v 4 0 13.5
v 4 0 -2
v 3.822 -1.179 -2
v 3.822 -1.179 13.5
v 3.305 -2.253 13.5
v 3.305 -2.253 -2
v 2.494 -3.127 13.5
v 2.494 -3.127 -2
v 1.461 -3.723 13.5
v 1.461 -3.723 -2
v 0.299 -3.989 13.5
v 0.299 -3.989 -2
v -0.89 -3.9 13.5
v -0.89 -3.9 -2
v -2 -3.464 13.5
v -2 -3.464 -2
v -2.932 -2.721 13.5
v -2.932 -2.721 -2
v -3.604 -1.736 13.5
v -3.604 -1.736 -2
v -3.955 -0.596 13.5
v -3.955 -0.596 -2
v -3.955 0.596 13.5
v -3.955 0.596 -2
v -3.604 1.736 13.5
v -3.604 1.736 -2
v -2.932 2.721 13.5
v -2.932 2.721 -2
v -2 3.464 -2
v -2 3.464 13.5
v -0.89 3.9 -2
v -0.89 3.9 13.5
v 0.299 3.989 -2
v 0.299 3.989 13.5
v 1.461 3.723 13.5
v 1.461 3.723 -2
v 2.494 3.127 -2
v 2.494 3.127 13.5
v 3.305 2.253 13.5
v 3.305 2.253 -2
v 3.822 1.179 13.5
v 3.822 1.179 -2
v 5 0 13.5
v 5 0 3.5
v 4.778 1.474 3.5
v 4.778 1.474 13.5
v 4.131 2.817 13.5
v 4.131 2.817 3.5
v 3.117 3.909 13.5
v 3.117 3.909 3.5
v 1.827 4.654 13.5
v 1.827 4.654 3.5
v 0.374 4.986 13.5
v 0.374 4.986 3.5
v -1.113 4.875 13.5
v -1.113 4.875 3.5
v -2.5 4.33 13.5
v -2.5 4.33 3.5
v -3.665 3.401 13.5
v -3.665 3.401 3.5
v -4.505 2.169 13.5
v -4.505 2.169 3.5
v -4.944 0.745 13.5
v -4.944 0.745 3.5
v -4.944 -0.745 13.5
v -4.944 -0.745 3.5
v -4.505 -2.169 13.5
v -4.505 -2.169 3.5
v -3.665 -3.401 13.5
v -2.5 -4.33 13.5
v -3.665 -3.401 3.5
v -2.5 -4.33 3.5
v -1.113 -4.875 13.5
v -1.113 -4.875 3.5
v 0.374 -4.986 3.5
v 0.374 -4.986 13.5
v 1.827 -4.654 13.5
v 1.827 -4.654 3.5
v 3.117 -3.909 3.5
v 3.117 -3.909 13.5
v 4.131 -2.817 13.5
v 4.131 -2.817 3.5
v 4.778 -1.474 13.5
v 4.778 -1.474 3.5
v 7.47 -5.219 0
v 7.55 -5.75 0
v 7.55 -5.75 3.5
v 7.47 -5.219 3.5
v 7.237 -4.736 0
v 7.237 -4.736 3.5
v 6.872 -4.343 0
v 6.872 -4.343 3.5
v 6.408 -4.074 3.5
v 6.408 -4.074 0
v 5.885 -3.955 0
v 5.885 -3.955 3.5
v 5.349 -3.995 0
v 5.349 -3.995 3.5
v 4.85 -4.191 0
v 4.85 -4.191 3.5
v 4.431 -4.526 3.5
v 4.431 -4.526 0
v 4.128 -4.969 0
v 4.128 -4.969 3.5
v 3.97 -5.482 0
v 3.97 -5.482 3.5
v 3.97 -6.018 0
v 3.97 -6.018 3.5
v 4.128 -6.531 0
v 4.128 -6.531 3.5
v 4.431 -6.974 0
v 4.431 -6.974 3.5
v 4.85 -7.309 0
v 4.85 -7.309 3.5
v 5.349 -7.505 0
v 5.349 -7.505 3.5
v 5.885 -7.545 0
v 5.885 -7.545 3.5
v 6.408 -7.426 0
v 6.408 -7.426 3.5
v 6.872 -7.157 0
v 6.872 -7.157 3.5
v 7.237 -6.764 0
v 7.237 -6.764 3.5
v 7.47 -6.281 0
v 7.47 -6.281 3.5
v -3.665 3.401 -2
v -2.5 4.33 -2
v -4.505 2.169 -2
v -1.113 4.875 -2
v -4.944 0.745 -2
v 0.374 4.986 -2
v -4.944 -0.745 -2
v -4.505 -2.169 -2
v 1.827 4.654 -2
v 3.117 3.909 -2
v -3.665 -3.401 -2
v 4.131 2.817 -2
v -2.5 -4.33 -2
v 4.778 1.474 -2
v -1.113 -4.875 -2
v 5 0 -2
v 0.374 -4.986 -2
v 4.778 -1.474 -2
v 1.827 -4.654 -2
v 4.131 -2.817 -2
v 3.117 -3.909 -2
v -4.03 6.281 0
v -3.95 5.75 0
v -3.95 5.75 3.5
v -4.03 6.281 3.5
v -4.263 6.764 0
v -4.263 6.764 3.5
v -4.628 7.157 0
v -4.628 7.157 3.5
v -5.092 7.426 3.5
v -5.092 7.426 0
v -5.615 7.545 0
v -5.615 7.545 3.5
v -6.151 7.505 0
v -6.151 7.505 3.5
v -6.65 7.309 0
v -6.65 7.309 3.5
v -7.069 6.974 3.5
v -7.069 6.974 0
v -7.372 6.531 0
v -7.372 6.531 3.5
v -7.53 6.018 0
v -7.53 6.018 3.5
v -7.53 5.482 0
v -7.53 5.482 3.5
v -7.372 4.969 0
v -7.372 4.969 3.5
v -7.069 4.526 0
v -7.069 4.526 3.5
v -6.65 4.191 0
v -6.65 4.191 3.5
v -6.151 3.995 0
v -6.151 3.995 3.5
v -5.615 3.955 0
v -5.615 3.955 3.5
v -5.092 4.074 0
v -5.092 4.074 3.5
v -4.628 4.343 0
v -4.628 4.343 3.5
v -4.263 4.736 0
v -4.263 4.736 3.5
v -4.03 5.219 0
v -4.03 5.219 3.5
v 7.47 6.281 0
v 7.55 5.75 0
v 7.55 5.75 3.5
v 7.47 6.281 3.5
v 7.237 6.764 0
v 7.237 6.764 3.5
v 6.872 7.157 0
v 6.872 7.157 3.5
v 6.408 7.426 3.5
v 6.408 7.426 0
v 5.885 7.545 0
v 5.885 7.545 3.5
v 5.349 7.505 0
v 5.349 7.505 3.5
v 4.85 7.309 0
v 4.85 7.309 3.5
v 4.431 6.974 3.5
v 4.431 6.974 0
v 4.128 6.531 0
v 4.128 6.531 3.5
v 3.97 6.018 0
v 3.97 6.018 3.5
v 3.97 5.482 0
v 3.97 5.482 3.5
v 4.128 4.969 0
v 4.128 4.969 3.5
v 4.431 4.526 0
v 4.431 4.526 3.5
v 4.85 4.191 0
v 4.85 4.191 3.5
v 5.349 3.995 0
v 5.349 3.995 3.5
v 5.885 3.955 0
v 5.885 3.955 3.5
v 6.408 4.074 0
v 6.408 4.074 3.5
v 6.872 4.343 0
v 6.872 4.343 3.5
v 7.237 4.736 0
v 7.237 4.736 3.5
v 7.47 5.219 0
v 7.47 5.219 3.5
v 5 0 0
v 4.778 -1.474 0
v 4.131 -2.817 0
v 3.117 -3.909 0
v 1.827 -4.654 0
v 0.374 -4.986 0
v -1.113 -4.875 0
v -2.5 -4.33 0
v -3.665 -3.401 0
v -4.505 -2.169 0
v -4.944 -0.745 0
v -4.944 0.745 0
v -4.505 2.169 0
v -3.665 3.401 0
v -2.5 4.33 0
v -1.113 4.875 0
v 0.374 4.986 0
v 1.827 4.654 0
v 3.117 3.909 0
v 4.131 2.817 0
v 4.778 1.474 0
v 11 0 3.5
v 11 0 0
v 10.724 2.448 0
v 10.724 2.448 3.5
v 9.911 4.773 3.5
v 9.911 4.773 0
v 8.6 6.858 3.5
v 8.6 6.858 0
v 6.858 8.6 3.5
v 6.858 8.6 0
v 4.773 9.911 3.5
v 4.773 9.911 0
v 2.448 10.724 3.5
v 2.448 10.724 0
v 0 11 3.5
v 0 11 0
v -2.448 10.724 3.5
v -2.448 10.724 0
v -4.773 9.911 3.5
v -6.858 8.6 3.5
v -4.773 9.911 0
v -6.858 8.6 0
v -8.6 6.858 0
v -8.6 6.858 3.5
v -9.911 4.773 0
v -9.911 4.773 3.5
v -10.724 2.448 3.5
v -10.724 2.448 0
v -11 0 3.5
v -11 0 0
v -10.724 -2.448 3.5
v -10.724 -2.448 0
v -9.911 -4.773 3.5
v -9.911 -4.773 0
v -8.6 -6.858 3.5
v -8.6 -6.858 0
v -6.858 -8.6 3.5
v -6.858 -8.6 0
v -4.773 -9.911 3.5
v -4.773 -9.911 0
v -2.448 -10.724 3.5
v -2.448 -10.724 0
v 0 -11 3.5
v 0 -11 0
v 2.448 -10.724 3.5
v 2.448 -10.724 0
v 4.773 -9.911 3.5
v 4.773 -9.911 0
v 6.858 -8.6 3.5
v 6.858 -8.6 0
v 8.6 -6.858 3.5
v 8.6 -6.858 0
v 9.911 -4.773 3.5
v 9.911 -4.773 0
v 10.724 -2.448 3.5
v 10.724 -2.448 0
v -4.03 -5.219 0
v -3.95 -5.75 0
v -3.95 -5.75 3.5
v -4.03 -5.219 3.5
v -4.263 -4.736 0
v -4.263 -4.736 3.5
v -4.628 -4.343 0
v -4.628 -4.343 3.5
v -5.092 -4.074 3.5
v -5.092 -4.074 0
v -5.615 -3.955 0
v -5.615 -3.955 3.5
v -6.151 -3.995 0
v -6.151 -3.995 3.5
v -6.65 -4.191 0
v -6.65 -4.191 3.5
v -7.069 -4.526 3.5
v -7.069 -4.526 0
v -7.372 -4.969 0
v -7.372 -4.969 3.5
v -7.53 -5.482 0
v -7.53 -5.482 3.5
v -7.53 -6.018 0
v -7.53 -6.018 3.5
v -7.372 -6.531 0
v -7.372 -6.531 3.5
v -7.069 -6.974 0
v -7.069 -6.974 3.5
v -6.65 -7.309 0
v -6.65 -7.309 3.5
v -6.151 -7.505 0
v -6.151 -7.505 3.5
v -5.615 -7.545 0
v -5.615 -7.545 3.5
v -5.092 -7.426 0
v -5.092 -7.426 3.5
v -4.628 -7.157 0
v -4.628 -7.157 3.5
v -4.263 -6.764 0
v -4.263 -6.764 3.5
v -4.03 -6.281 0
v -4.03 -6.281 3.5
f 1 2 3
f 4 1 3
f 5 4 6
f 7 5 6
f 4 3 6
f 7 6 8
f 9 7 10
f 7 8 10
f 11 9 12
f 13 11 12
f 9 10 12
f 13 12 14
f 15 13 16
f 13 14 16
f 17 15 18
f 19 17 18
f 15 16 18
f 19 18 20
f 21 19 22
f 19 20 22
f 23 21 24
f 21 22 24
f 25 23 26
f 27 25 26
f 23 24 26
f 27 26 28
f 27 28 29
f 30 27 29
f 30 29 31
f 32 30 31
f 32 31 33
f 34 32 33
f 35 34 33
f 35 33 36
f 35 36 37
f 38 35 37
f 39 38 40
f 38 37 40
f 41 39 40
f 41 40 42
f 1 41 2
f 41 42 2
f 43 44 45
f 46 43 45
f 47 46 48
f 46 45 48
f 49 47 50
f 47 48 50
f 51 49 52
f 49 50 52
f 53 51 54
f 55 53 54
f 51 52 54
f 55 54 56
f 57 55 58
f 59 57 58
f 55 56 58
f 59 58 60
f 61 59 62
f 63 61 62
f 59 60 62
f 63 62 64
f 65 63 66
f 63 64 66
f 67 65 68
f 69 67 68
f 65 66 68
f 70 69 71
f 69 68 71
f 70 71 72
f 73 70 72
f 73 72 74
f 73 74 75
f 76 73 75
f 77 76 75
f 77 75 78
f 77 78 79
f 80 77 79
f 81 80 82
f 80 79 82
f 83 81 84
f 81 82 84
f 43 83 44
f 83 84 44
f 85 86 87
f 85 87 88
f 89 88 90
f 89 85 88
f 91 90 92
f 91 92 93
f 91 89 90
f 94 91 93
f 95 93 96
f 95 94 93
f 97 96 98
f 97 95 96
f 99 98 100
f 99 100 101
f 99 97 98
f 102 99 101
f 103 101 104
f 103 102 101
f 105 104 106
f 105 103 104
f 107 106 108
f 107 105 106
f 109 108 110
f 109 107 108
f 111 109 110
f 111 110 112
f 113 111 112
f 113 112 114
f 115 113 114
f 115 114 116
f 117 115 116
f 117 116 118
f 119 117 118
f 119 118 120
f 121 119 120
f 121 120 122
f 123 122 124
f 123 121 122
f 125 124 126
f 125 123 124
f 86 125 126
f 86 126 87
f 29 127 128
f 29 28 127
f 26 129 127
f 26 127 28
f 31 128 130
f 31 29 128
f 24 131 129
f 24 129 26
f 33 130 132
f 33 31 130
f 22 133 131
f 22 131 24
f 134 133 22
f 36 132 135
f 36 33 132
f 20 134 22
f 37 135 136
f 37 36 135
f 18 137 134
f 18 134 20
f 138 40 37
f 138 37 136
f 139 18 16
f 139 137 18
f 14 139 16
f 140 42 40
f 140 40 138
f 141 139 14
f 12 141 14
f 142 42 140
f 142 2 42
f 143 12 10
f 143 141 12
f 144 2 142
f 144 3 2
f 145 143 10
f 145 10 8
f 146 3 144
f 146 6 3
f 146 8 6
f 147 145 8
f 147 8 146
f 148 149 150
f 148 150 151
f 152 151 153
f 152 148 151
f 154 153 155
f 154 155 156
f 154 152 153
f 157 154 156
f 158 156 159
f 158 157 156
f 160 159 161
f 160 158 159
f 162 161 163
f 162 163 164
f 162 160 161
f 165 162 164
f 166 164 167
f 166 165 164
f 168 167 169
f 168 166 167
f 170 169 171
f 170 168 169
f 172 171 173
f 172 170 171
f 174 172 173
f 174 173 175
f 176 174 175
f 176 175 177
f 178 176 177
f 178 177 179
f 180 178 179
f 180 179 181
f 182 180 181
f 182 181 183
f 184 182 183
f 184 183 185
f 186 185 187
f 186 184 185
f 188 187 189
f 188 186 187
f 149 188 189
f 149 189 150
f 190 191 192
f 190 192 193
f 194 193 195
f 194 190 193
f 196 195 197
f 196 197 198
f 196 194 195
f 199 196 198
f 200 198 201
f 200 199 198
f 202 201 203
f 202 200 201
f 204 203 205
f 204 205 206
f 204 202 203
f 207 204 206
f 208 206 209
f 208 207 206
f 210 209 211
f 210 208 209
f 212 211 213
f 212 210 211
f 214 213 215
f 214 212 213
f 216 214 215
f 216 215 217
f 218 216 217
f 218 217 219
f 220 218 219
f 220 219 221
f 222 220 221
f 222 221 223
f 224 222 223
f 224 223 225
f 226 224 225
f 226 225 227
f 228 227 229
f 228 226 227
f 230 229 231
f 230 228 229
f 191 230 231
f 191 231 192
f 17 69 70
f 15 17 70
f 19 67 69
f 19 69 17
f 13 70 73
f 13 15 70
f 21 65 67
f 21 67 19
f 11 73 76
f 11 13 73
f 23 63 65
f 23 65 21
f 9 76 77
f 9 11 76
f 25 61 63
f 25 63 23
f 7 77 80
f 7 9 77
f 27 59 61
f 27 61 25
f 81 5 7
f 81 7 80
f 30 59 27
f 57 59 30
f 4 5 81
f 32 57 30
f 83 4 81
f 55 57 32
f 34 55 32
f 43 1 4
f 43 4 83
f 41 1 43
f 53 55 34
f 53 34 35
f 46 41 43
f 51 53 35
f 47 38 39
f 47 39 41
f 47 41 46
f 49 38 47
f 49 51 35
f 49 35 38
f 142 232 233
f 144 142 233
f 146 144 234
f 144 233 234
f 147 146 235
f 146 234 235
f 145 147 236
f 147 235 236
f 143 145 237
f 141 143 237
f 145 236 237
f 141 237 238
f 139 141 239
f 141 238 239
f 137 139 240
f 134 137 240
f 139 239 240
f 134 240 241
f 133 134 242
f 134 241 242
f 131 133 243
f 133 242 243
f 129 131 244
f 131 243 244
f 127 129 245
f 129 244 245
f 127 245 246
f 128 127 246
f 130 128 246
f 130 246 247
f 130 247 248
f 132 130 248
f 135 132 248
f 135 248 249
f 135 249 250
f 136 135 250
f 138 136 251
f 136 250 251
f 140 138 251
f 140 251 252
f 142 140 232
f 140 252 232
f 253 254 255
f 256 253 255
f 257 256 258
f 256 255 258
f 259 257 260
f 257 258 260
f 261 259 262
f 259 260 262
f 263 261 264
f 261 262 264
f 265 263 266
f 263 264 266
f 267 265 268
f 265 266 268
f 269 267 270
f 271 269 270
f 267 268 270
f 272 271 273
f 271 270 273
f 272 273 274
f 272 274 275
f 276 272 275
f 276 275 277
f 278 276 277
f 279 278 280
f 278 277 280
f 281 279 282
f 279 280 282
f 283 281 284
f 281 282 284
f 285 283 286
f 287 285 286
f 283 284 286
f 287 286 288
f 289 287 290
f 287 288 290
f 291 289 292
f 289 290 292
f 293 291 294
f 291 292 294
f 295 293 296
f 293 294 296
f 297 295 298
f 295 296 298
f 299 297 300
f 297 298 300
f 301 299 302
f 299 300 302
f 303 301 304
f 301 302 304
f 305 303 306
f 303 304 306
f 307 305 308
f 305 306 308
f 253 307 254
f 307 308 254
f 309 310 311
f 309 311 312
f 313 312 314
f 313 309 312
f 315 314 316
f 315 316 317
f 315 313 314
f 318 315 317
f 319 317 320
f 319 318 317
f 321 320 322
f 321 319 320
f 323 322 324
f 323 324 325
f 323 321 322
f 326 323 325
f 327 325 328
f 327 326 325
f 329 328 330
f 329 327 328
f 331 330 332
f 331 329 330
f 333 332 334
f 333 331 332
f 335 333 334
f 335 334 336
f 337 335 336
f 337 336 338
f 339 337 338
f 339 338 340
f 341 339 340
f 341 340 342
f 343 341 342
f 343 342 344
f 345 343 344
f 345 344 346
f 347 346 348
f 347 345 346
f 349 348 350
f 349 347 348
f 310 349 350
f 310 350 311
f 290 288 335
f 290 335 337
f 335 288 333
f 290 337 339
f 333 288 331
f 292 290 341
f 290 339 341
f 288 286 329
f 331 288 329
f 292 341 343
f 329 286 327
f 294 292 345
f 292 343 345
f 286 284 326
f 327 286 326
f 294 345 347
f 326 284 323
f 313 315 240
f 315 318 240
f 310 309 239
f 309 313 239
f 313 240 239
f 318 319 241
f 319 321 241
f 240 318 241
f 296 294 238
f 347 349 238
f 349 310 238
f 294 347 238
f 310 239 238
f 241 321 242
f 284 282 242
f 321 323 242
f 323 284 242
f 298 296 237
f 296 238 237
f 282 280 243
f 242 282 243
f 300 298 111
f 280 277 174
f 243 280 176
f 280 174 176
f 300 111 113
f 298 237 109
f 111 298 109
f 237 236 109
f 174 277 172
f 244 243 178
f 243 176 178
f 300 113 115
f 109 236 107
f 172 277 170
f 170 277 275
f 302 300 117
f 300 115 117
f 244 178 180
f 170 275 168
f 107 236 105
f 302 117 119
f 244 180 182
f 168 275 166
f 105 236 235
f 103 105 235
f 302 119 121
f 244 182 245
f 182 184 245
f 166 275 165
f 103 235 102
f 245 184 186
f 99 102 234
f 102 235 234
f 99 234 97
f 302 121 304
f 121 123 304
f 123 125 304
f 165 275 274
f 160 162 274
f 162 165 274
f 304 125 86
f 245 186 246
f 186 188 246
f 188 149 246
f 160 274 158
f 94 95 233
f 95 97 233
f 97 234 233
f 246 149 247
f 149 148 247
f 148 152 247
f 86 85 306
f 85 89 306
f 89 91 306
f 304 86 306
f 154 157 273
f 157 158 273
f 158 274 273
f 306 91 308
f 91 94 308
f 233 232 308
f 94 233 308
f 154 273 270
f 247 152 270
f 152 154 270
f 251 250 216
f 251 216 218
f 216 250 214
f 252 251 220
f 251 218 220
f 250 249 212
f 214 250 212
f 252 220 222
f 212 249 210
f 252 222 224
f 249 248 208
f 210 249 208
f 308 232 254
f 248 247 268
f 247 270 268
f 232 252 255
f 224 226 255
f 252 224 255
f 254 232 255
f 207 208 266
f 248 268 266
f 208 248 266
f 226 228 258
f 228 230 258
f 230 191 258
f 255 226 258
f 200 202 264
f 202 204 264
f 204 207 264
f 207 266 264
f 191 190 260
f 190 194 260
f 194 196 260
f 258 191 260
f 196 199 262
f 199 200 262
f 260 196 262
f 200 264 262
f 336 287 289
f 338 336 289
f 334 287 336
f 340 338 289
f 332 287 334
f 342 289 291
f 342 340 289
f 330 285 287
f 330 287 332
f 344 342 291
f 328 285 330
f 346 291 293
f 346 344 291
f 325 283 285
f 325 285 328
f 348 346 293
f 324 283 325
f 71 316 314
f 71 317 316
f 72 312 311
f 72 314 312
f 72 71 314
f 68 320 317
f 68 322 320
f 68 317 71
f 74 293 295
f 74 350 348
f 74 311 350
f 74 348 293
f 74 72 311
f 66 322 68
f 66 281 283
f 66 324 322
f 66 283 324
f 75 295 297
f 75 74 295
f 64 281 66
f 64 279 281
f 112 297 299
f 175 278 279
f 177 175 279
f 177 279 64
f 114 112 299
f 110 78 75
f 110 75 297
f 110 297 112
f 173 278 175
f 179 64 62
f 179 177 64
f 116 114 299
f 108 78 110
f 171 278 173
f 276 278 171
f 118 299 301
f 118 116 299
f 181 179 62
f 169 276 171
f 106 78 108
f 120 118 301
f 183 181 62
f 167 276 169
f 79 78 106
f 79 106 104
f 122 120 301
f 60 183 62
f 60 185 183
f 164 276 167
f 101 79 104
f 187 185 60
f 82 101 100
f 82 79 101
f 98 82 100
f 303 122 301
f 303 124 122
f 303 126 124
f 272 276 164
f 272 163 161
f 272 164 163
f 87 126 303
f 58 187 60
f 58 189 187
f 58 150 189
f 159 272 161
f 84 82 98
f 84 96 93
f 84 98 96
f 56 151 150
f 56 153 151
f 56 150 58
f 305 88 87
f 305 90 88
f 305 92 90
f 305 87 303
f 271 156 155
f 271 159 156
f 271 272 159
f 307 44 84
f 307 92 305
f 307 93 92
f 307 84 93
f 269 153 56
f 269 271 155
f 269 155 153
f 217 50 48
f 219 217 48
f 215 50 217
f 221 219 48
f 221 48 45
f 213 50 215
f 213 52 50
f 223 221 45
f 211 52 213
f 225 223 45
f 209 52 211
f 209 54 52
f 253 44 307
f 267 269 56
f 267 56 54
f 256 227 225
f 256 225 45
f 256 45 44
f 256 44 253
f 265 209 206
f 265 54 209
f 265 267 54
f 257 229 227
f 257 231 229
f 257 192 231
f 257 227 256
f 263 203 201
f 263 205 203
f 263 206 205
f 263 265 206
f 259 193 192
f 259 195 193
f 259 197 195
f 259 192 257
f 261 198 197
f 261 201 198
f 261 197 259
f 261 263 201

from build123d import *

# Parameters (mm, degrees)
SKETCH_R     = 11
SKETCH_R_2   = 1.8
PAD_DEPTH    = 3.5
SKETCH001_R  = 5
PAD001_DEPTH = 10
SKETCH002_R  = 5
PAD002_DEPTH = 2
SKETCH003_R  = 4
POCKET_DEPTH = 15.5


with BuildPart() as part:
    # Sketch → Pad (new body)
    with BuildSketch(Plane.XY):
        Circle(SKETCH_R)
        with Locations((-5.75, 5.75)):
            Circle(SKETCH_R_2, mode=Mode.SUBTRACT)
        with Locations((5.75, 5.75)):
            Circle(SKETCH_R_2, mode=Mode.SUBTRACT)
        with Locations((5.75, -5.75)):
            Circle(SKETCH_R_2, mode=Mode.SUBTRACT)
        with Locations((-5.75, -5.75)):
            Circle(SKETCH_R_2, mode=Mode.SUBTRACT)
    extrude(amount=PAD_DEPTH)

    # Sketch001 → Pad001 (new body)
    with BuildSketch(Plane.XY.offset(3.5)):
        Circle(SKETCH001_R)
    extrude(amount=PAD001_DEPTH)

    # Sketch002 → Pad002 (new body)
    with BuildSketch(Plane(origin=(0, 0, 0), x_dir=(1, 0, 0), z_dir=(0, 0, -1))):
        Circle(SKETCH002_R)
    extrude(amount=PAD002_DEPTH)

    # Sketch003 → Pocket (cut)
    with BuildSketch(Plane(origin=(0, 0, -2), x_dir=(1, 0, 0), z_dir=(0, 0, -1))):
        Circle(SKETCH003_R)
    extrude(amount=-POCKET_DEPTH, mode=Mode.SUBTRACT)


solid = part.part
